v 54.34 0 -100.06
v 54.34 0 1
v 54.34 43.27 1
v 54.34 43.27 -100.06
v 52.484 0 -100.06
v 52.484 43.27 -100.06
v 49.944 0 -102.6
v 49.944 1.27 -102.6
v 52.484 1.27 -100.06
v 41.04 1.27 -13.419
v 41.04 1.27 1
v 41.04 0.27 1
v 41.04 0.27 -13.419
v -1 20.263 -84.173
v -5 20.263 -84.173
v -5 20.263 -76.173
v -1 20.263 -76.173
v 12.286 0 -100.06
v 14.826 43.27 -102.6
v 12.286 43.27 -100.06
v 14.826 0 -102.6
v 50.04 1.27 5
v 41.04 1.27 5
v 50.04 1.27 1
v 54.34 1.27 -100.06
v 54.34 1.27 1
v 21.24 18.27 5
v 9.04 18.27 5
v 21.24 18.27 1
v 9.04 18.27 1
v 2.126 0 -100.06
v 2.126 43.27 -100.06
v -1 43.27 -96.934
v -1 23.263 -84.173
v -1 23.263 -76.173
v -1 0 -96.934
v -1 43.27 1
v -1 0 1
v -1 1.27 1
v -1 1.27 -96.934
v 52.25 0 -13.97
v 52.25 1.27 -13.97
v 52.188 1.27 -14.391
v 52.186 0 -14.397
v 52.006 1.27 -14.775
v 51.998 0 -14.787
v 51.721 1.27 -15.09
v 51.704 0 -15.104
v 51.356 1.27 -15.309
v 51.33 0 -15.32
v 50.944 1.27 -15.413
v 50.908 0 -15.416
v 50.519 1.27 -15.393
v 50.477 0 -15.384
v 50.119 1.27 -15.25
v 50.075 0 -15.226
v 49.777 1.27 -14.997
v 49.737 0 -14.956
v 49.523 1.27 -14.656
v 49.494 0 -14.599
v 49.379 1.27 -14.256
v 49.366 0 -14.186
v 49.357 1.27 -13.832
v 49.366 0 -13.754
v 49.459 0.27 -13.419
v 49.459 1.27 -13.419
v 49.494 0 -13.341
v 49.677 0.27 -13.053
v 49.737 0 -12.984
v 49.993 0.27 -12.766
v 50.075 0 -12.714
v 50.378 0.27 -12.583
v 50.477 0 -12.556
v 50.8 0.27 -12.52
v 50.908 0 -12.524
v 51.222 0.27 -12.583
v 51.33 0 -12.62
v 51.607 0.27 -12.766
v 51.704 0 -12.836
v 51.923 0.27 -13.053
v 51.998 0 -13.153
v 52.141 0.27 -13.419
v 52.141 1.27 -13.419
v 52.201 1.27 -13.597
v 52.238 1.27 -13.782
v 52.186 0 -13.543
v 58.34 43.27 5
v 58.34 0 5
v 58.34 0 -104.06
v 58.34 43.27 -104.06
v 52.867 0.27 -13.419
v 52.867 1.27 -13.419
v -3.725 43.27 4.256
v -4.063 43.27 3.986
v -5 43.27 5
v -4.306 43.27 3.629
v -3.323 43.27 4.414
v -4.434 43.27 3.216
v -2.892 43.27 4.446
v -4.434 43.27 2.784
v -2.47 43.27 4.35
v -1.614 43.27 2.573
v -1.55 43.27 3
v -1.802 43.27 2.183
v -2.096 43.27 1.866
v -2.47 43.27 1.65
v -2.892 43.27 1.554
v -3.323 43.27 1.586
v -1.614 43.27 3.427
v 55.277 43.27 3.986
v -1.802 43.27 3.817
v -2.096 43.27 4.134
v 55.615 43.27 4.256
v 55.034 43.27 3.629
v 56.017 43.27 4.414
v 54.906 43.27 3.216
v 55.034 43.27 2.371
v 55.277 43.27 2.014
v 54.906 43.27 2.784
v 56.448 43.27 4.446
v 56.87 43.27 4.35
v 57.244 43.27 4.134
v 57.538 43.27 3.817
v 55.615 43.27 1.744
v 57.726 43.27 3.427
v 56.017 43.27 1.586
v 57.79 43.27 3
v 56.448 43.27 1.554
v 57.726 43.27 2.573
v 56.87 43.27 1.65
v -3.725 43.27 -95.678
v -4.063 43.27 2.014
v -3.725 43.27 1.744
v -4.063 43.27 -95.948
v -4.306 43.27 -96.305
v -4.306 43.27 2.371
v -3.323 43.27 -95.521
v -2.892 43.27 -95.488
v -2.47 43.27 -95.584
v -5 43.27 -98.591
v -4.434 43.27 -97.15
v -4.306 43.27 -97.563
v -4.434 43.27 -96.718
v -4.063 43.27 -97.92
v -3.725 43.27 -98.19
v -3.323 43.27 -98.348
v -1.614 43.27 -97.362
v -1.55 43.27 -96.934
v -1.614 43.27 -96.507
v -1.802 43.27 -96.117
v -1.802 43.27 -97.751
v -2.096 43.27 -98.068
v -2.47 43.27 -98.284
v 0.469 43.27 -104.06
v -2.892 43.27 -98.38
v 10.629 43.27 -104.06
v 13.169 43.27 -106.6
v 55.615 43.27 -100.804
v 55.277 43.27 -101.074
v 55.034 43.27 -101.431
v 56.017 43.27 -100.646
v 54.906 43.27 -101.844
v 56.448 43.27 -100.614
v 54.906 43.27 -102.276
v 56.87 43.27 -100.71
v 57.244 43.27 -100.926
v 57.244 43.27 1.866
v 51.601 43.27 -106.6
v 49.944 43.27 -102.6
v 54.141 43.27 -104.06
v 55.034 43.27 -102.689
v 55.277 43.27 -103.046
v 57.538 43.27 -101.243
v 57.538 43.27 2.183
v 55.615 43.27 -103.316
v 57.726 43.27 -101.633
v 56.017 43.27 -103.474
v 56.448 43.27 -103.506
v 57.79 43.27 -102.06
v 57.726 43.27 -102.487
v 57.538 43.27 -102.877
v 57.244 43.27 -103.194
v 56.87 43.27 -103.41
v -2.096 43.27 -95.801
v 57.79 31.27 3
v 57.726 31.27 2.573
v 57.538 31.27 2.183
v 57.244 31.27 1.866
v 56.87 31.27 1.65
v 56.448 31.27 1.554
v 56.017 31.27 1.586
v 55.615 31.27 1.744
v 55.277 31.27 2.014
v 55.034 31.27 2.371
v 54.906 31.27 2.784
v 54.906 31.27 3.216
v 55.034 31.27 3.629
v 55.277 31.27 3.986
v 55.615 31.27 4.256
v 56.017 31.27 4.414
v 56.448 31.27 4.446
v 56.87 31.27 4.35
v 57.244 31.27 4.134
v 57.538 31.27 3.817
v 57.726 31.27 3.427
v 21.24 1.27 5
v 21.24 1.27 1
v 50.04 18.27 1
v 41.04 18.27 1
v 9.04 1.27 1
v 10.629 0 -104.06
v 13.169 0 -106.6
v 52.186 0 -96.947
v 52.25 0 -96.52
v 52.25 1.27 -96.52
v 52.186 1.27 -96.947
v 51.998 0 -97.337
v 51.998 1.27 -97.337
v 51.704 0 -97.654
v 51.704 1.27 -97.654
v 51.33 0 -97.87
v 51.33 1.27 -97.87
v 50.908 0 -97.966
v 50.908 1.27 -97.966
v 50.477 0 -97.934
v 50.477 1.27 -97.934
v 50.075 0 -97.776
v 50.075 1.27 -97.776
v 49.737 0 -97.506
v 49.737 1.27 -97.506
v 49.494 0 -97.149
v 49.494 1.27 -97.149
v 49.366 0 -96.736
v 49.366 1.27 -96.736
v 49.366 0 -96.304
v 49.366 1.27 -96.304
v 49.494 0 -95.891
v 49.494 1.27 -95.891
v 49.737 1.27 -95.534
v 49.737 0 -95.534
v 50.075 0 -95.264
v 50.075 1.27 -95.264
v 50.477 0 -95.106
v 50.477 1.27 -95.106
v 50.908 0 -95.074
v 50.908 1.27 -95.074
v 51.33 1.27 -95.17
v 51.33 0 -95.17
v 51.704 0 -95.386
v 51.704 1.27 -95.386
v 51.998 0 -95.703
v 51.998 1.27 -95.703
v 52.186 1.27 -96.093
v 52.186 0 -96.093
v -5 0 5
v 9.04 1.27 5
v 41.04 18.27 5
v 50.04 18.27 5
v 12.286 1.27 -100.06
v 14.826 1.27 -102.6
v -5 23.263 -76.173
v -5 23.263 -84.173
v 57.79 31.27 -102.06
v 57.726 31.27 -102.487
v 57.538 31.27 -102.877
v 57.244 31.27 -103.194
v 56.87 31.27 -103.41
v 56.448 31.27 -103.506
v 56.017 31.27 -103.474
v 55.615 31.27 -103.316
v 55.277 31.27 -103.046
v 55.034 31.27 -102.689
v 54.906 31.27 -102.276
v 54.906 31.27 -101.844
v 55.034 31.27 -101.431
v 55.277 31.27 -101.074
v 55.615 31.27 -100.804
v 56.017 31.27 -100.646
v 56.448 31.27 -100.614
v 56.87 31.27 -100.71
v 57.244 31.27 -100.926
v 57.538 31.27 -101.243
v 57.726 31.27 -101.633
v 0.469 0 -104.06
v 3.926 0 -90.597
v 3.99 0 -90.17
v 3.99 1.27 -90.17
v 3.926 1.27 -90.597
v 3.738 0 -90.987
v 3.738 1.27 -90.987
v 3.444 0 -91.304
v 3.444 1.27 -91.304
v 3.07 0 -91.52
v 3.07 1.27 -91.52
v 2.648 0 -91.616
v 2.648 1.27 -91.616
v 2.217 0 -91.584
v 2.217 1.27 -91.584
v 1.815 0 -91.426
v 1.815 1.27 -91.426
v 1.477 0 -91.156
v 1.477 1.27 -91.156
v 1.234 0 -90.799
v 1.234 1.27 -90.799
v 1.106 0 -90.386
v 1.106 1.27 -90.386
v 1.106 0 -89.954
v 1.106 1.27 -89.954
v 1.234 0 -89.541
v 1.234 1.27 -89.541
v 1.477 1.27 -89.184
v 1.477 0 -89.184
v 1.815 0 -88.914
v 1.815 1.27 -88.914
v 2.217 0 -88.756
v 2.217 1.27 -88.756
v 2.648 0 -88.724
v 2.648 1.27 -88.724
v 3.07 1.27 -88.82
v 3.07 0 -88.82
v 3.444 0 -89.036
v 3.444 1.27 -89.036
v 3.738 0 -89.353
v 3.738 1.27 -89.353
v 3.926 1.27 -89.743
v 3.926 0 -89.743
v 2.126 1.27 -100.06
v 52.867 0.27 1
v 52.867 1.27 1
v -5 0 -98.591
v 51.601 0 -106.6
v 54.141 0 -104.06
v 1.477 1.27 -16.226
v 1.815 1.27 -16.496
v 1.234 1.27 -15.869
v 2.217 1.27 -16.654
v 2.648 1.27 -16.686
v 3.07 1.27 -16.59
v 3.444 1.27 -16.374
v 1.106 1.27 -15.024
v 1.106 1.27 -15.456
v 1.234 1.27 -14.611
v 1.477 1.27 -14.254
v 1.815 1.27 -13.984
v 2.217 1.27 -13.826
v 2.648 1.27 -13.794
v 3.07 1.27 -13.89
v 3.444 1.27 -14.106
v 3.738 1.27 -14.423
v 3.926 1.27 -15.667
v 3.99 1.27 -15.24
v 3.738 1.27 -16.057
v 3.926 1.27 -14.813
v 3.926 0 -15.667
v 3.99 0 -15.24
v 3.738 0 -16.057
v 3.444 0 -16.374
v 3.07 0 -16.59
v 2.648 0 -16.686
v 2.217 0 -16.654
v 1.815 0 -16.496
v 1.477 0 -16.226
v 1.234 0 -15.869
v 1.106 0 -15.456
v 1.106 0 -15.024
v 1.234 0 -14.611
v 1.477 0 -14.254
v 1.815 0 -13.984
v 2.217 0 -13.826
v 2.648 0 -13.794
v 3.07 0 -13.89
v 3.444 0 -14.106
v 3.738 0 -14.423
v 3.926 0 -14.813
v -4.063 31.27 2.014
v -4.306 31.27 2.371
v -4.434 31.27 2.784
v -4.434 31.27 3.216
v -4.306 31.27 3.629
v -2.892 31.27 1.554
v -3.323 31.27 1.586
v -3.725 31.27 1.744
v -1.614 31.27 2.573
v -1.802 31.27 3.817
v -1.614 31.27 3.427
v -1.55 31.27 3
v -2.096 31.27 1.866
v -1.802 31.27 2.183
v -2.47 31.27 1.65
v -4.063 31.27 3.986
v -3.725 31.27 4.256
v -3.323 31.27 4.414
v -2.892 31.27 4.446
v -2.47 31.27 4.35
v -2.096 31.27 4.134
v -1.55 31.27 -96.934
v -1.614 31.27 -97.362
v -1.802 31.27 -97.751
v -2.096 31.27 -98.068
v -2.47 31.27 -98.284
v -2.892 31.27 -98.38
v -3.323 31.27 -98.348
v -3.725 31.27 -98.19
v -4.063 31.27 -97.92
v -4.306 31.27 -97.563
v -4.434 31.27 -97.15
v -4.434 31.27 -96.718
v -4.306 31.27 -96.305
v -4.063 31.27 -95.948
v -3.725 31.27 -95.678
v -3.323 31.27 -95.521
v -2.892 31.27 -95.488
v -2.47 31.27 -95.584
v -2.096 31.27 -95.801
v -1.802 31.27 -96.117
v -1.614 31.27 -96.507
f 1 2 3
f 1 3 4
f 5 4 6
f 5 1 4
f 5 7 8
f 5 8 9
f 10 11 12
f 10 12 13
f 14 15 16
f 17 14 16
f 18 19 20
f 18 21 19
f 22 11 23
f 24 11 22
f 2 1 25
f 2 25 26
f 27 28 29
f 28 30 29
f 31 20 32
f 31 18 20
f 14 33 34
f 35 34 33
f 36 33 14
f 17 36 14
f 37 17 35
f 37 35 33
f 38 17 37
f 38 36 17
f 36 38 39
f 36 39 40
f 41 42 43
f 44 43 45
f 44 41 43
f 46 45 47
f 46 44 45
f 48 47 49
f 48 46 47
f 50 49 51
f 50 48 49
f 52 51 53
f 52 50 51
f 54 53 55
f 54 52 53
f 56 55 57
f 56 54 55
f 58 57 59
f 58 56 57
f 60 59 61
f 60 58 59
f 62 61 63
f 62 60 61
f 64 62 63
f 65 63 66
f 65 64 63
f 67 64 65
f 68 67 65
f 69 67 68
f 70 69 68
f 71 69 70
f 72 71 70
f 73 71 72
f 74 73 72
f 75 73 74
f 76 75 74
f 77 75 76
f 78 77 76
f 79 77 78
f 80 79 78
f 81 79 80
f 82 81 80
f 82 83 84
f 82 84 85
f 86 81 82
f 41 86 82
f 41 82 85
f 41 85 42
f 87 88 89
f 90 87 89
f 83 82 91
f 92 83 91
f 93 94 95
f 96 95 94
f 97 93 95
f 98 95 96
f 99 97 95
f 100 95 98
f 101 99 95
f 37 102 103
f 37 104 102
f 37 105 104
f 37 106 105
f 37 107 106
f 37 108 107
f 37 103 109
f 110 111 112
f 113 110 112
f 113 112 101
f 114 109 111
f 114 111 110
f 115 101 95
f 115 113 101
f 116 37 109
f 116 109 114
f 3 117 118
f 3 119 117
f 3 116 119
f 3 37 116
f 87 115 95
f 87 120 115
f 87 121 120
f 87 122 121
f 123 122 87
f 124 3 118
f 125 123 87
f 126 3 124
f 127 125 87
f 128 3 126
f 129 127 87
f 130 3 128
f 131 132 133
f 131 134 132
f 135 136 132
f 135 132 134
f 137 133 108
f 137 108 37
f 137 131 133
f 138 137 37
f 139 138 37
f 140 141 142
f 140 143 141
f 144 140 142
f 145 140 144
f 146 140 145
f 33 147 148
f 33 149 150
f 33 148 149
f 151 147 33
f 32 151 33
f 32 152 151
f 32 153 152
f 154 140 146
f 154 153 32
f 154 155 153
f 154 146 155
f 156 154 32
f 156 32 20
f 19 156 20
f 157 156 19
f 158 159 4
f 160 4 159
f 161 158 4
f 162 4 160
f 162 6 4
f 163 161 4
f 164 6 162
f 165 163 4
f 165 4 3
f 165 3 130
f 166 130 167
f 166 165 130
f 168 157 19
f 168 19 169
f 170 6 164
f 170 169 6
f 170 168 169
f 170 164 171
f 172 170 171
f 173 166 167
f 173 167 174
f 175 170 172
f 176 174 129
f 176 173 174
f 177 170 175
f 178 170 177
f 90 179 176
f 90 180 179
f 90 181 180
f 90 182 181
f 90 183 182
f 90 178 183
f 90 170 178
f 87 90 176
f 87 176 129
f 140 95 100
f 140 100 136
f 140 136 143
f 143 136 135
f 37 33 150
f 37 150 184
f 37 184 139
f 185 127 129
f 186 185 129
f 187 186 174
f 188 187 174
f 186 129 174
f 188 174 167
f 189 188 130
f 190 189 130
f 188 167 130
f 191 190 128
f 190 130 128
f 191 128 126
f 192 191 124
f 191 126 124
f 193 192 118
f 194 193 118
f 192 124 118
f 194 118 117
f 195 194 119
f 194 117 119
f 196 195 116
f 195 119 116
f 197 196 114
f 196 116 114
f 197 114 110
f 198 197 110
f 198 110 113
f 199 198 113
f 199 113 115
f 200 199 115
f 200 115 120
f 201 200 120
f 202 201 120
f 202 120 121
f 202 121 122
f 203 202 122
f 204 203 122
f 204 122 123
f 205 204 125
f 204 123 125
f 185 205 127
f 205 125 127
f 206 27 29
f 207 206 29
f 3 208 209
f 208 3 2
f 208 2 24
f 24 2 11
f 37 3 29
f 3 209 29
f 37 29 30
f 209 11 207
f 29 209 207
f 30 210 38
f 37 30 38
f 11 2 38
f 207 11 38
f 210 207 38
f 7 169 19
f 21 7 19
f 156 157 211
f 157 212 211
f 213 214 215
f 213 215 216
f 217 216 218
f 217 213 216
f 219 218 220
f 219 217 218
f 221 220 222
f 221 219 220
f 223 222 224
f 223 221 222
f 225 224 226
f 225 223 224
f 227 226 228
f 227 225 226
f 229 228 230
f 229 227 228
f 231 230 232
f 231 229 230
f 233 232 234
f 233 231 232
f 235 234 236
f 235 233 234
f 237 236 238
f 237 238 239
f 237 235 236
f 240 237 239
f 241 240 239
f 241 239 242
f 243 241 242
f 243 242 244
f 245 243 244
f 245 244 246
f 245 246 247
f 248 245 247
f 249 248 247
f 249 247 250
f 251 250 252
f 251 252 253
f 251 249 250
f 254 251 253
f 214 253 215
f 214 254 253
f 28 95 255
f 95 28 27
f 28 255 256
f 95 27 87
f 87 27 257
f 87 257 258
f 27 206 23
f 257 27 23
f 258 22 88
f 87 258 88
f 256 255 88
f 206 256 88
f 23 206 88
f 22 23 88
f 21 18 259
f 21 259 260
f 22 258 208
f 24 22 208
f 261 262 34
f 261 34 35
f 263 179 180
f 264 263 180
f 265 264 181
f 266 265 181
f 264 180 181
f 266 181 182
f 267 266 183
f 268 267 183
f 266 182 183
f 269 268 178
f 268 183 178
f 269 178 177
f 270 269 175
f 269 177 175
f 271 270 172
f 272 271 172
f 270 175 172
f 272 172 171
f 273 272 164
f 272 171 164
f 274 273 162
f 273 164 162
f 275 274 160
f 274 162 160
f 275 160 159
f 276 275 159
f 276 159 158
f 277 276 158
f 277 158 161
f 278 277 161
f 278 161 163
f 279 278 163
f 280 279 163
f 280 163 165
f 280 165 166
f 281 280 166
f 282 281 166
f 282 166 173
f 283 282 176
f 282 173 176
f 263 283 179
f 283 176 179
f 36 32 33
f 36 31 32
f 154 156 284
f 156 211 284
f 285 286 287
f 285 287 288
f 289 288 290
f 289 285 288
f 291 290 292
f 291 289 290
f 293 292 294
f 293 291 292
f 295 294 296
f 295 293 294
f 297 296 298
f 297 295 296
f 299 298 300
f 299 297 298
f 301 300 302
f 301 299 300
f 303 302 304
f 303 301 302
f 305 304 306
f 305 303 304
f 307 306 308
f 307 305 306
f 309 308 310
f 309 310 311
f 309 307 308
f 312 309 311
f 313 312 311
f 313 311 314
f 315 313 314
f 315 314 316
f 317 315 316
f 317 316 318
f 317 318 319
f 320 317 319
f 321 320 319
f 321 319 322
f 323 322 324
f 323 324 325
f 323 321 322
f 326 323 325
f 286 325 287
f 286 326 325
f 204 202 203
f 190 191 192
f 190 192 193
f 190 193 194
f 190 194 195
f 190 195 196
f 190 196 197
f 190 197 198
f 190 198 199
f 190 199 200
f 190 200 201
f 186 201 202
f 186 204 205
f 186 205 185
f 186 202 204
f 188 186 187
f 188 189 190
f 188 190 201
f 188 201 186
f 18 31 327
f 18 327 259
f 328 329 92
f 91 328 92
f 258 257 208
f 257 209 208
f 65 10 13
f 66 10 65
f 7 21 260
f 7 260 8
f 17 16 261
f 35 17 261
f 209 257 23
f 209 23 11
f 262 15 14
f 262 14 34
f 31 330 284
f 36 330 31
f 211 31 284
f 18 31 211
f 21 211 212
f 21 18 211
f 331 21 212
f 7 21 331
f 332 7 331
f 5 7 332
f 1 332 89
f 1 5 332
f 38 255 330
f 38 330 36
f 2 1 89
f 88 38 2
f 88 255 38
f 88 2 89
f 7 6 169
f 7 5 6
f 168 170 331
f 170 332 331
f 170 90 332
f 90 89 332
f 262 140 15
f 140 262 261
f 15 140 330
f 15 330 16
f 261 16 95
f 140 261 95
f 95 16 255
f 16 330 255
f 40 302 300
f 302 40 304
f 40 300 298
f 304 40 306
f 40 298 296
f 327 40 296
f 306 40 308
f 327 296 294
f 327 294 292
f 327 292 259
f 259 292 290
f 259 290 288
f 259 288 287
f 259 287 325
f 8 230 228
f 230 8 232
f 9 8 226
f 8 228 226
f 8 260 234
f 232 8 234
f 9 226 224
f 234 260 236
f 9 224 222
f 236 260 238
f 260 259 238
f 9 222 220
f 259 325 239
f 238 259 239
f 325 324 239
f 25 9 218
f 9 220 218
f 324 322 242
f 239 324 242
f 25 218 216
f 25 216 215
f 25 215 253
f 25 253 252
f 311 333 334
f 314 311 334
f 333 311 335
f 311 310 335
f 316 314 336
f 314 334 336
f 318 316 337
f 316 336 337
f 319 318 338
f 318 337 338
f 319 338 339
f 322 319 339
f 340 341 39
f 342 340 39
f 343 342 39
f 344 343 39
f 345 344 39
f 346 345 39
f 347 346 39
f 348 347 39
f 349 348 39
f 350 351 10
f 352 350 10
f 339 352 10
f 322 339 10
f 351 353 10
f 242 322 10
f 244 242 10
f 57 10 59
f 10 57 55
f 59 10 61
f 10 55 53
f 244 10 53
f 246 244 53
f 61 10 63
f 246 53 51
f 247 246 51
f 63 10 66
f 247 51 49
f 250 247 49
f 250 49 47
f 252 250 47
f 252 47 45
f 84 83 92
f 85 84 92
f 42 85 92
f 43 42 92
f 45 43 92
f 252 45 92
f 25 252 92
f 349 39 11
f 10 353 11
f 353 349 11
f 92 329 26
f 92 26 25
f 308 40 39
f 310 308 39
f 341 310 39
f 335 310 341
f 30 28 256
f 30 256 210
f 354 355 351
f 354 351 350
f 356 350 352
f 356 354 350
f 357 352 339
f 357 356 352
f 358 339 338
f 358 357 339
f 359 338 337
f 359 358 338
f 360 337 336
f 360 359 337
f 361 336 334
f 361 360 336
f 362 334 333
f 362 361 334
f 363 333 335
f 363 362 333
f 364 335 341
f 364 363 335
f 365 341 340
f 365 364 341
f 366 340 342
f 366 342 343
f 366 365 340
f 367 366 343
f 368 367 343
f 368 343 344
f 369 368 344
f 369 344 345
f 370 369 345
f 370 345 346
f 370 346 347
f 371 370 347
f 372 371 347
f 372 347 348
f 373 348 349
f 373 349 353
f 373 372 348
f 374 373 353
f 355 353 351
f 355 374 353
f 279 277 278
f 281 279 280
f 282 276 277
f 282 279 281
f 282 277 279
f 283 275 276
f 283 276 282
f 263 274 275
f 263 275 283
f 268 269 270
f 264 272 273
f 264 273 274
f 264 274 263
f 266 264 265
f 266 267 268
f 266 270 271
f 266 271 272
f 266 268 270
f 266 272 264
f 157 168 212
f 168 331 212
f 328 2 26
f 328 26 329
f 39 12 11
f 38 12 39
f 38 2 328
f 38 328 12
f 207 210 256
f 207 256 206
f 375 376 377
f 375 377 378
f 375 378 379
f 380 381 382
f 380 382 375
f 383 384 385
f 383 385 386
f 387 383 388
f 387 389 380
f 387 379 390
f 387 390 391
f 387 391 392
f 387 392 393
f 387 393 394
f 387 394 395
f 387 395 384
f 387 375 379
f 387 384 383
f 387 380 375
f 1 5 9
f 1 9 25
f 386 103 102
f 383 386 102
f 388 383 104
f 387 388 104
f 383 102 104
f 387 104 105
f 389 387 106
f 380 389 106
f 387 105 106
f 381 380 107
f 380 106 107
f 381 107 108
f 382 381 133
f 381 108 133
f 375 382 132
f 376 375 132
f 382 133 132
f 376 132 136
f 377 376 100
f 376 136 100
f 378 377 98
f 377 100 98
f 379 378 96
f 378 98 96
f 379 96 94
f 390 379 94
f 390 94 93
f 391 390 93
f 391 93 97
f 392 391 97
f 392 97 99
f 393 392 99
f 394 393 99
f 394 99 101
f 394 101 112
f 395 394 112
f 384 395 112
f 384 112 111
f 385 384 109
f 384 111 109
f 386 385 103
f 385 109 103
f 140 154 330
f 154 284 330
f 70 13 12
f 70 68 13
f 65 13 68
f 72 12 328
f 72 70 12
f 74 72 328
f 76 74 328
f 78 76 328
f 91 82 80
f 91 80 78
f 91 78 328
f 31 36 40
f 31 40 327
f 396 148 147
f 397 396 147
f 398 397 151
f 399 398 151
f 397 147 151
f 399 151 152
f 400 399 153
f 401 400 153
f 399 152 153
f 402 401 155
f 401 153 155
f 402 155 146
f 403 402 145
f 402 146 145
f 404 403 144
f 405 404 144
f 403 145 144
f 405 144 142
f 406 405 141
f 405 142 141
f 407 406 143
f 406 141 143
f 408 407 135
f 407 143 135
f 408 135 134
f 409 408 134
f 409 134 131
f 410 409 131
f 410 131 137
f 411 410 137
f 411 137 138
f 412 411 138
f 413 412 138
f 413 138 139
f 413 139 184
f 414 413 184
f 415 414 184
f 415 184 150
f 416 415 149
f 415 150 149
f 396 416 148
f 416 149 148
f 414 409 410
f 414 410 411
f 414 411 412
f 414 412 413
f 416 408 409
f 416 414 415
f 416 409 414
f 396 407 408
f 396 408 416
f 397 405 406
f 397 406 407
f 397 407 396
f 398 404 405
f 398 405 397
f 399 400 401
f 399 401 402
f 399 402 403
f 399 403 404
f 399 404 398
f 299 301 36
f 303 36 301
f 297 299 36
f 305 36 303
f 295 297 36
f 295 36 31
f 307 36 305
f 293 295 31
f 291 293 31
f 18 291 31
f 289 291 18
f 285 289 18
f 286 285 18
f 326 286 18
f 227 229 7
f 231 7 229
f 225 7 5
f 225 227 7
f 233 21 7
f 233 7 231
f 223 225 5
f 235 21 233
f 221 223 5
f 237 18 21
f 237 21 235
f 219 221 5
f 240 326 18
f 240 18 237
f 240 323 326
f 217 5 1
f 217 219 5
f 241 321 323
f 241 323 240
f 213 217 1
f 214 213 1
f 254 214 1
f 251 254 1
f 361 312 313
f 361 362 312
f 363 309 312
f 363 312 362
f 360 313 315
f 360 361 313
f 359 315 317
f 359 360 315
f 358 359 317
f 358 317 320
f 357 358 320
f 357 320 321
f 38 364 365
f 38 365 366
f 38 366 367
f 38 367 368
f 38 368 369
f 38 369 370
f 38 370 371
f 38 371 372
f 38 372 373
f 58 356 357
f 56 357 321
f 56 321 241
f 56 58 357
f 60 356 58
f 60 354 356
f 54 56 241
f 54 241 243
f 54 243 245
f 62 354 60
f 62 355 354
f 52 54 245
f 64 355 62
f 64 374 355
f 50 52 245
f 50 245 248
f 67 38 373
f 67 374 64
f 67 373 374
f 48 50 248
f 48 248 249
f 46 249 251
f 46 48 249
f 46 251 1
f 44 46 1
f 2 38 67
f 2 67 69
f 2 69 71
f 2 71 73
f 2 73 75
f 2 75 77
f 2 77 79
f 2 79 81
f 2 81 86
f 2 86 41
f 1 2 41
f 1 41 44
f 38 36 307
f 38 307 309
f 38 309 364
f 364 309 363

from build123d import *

# Parameters (mm, degrees)
SKETCH2_R           = 1.45
BOSS_EXTRUDE1_DEPTH = 1.27
BOSS_EXTRUDE2_DEPTH = 1.27
BOSS_EXTRUDE3_DEPTH = 18.27
SKETCH5_W           = 12.2
SKETCH5_H           = 4
SKETCH5_W_2         = 9
CUT_EXTRUDE1_DEPTH  = 17
BOSS_EXTRUDE4_DEPTH = 25
SKETCH7_R           = 1.45
CUT_EXTRUDE2_DEPTH  = 12
SKETCH8_W           = 8
SKETCH8_H           = 3
CUT_EXTRUDE3_DEPTH  = 4
SKETCH9_W           = 11.827328024
SKETCH9_H           = 14.418956252
CUT_EXTRUDE4_DEPTH  = 1


with BuildPart() as part:
    # Sketch2 → Boss-Extrude1 (new body)
    with BuildSketch(Plane(origin=(0, 0, 0), x_dir=(1, 0, 0), z_dir=(0, 1, 0))):
        Polygon((52.07, 99.06), (49.53, 101.6), (15.24, 101.6), (12.7, 99.06), (2.54, 99.06), (0, 96.52), (0, 0), (53.34, 0), (53.34, 99.06), align=None)
        with Locations((50.8, 13.97)):
            Circle(SKETCH2_R, mode=Mode.SUBTRACT)
        with Locations((2.54, 15.24)):
            Circle(SKETCH2_R, mode=Mode.SUBTRACT)
        with Locations((50.8, 96.52)):
            Circle(SKETCH2_R, mode=Mode.SUBTRACT)
        with Locations((2.54, 90.17)):
            Circle(SKETCH2_R, mode=Mode.SUBTRACT)
    extrude(amount=BOSS_EXTRUDE1_DEPTH)

    # Sketch3 → Boss-Extrude2 (add)
    with BuildSketch(Plane.XZ):
        Polygon((49.944213562, -102.6), (52.484213562, -100.06), (54.34, -100.06), (54.34, 1), (-1, 1), (-1, -96.934213562), (2.125786438, -100.06), (12.285786438, -100.06), (14.825786438, -102.6), align=None)
        Polygon((0, 0), (0, -96.52), (2.54, -99.06), (12.7, -99.06), (15.24, -101.6), (49.53, -101.6), (52.07, -99.06), (53.34, -99.06), (53.34, 0), align=None, mode=Mode.SUBTRACT)
    extrude(amount=-BOSS_EXTRUDE2_DEPTH)

    # Sketch9 → Cut-Extrude4 (cut)
    with BuildSketch(Plane(origin=(0, 1.27, 0), x_dir=(1, 0, 0), z_dir=(0, 1, 0))):
        with Locations((46.953664012, 6.209478126)):
            Rectangle(SKETCH9_W, SKETCH9_H)
    extrude(amount=-CUT_EXTRUDE4_DEPTH, mode=Mode.SUBTRACT)


with BuildPart() as body_2:
    # Sketch4 → Boss-Extrude3 (new body)
    with BuildSketch(Plane.XZ):
        Polygon((-5, 5), (-5, -98.591067812), (0.468932188, -104.06), (10.628932188, -104.06), (13.168932188, -106.6), (51.601067812, -106.6), (54.141067812, -104.06), (58.34, -104.06), (58.34, 5), align=None)
        Polygon((14.825786438, -102.6), (49.944213562, -102.6), (52.484213562, -100.06), (54.34, -100.06), (54.34, 1), (-1, 1), (-1, -96.934213562), (2.125786438, -100.06), (12.285786438, -100.06), align=None, mode=Mode.SUBTRACT)
    extrude(amount=-BOSS_EXTRUDE3_DEPTH)

    # Sketch5 → Cut-Extrude1 (cut)
    with BuildSketch(Plane(origin=(0, 18.27, 0), x_dir=(1, 0, 0), z_dir=(0, 1, 0))):
        with Locations((15.14, -3)):
            Rectangle(SKETCH5_W, SKETCH5_H)
        with Locations((45.54, -3)):
            Rectangle(SKETCH5_W_2, SKETCH5_H)
    extrude(amount=-CUT_EXTRUDE1_DEPTH, mode=Mode.SUBTRACT)

    # Sketch6 → Boss-Extrude4 (add)
    with BuildSketch(Plane(origin=(0, 18.27, 0), x_dir=(1, 0, 0), z_dir=(0, 1, 0))):
        Polygon((9.04, -5), (50.04, -5), (58.34, -5), (58.34, 104.06), (54.141067812, 104.06), (51.601067812, 106.6), (13.168932188, 106.6), (10.628932188, 104.06), (0.468932188, 104.06), (-5, 98.591067812), (-5, -5), align=None)
        Polygon((9.04, -1), (50.04, -1), (54.34, -1), (54.34, 100.06), (52.484213562, 100.06), (49.944213562, 102.6), (14.825786438, 102.6), (12.285786438, 100.06), (2.125786438, 100.06), (-1, 96.934213562), (-1, -1), align=None, mode=Mode.SUBTRACT)
    extrude(amount=BOSS_EXTRUDE4_DEPTH)

    # Sketch7 → Cut-Extrude2 (cut)
    with BuildSketch(Plane(origin=(0, 43.27, 0), x_dir=(1, 0, 0), z_dir=(0, 1, 0))):
        with Locations((-3, -3)):
            Circle(SKETCH7_R)
        with Locations((56.34, -3)):
            Circle(SKETCH7_R)
        with Locations((56.34, 102.06)):
            Circle(SKETCH7_R)
        with Locations((-3, 96.934213562)):
            Circle(SKETCH7_R)
    extrude(amount=-CUT_EXTRUDE2_DEPTH, mode=Mode.SUBTRACT)

    # Sketch8 → Cut-Extrude3 (cut)
    with BuildSketch(Plane.ZY.offset(5)):
        with Locations((-80.173407403, 21.762666212)):
            Rectangle(SKETCH8_W, SKETCH8_H)
    extrude(amount=-CUT_EXTRUDE3_DEPTH, mode=Mode.SUBTRACT)


solid = Compound([part.part, body_2.part])
